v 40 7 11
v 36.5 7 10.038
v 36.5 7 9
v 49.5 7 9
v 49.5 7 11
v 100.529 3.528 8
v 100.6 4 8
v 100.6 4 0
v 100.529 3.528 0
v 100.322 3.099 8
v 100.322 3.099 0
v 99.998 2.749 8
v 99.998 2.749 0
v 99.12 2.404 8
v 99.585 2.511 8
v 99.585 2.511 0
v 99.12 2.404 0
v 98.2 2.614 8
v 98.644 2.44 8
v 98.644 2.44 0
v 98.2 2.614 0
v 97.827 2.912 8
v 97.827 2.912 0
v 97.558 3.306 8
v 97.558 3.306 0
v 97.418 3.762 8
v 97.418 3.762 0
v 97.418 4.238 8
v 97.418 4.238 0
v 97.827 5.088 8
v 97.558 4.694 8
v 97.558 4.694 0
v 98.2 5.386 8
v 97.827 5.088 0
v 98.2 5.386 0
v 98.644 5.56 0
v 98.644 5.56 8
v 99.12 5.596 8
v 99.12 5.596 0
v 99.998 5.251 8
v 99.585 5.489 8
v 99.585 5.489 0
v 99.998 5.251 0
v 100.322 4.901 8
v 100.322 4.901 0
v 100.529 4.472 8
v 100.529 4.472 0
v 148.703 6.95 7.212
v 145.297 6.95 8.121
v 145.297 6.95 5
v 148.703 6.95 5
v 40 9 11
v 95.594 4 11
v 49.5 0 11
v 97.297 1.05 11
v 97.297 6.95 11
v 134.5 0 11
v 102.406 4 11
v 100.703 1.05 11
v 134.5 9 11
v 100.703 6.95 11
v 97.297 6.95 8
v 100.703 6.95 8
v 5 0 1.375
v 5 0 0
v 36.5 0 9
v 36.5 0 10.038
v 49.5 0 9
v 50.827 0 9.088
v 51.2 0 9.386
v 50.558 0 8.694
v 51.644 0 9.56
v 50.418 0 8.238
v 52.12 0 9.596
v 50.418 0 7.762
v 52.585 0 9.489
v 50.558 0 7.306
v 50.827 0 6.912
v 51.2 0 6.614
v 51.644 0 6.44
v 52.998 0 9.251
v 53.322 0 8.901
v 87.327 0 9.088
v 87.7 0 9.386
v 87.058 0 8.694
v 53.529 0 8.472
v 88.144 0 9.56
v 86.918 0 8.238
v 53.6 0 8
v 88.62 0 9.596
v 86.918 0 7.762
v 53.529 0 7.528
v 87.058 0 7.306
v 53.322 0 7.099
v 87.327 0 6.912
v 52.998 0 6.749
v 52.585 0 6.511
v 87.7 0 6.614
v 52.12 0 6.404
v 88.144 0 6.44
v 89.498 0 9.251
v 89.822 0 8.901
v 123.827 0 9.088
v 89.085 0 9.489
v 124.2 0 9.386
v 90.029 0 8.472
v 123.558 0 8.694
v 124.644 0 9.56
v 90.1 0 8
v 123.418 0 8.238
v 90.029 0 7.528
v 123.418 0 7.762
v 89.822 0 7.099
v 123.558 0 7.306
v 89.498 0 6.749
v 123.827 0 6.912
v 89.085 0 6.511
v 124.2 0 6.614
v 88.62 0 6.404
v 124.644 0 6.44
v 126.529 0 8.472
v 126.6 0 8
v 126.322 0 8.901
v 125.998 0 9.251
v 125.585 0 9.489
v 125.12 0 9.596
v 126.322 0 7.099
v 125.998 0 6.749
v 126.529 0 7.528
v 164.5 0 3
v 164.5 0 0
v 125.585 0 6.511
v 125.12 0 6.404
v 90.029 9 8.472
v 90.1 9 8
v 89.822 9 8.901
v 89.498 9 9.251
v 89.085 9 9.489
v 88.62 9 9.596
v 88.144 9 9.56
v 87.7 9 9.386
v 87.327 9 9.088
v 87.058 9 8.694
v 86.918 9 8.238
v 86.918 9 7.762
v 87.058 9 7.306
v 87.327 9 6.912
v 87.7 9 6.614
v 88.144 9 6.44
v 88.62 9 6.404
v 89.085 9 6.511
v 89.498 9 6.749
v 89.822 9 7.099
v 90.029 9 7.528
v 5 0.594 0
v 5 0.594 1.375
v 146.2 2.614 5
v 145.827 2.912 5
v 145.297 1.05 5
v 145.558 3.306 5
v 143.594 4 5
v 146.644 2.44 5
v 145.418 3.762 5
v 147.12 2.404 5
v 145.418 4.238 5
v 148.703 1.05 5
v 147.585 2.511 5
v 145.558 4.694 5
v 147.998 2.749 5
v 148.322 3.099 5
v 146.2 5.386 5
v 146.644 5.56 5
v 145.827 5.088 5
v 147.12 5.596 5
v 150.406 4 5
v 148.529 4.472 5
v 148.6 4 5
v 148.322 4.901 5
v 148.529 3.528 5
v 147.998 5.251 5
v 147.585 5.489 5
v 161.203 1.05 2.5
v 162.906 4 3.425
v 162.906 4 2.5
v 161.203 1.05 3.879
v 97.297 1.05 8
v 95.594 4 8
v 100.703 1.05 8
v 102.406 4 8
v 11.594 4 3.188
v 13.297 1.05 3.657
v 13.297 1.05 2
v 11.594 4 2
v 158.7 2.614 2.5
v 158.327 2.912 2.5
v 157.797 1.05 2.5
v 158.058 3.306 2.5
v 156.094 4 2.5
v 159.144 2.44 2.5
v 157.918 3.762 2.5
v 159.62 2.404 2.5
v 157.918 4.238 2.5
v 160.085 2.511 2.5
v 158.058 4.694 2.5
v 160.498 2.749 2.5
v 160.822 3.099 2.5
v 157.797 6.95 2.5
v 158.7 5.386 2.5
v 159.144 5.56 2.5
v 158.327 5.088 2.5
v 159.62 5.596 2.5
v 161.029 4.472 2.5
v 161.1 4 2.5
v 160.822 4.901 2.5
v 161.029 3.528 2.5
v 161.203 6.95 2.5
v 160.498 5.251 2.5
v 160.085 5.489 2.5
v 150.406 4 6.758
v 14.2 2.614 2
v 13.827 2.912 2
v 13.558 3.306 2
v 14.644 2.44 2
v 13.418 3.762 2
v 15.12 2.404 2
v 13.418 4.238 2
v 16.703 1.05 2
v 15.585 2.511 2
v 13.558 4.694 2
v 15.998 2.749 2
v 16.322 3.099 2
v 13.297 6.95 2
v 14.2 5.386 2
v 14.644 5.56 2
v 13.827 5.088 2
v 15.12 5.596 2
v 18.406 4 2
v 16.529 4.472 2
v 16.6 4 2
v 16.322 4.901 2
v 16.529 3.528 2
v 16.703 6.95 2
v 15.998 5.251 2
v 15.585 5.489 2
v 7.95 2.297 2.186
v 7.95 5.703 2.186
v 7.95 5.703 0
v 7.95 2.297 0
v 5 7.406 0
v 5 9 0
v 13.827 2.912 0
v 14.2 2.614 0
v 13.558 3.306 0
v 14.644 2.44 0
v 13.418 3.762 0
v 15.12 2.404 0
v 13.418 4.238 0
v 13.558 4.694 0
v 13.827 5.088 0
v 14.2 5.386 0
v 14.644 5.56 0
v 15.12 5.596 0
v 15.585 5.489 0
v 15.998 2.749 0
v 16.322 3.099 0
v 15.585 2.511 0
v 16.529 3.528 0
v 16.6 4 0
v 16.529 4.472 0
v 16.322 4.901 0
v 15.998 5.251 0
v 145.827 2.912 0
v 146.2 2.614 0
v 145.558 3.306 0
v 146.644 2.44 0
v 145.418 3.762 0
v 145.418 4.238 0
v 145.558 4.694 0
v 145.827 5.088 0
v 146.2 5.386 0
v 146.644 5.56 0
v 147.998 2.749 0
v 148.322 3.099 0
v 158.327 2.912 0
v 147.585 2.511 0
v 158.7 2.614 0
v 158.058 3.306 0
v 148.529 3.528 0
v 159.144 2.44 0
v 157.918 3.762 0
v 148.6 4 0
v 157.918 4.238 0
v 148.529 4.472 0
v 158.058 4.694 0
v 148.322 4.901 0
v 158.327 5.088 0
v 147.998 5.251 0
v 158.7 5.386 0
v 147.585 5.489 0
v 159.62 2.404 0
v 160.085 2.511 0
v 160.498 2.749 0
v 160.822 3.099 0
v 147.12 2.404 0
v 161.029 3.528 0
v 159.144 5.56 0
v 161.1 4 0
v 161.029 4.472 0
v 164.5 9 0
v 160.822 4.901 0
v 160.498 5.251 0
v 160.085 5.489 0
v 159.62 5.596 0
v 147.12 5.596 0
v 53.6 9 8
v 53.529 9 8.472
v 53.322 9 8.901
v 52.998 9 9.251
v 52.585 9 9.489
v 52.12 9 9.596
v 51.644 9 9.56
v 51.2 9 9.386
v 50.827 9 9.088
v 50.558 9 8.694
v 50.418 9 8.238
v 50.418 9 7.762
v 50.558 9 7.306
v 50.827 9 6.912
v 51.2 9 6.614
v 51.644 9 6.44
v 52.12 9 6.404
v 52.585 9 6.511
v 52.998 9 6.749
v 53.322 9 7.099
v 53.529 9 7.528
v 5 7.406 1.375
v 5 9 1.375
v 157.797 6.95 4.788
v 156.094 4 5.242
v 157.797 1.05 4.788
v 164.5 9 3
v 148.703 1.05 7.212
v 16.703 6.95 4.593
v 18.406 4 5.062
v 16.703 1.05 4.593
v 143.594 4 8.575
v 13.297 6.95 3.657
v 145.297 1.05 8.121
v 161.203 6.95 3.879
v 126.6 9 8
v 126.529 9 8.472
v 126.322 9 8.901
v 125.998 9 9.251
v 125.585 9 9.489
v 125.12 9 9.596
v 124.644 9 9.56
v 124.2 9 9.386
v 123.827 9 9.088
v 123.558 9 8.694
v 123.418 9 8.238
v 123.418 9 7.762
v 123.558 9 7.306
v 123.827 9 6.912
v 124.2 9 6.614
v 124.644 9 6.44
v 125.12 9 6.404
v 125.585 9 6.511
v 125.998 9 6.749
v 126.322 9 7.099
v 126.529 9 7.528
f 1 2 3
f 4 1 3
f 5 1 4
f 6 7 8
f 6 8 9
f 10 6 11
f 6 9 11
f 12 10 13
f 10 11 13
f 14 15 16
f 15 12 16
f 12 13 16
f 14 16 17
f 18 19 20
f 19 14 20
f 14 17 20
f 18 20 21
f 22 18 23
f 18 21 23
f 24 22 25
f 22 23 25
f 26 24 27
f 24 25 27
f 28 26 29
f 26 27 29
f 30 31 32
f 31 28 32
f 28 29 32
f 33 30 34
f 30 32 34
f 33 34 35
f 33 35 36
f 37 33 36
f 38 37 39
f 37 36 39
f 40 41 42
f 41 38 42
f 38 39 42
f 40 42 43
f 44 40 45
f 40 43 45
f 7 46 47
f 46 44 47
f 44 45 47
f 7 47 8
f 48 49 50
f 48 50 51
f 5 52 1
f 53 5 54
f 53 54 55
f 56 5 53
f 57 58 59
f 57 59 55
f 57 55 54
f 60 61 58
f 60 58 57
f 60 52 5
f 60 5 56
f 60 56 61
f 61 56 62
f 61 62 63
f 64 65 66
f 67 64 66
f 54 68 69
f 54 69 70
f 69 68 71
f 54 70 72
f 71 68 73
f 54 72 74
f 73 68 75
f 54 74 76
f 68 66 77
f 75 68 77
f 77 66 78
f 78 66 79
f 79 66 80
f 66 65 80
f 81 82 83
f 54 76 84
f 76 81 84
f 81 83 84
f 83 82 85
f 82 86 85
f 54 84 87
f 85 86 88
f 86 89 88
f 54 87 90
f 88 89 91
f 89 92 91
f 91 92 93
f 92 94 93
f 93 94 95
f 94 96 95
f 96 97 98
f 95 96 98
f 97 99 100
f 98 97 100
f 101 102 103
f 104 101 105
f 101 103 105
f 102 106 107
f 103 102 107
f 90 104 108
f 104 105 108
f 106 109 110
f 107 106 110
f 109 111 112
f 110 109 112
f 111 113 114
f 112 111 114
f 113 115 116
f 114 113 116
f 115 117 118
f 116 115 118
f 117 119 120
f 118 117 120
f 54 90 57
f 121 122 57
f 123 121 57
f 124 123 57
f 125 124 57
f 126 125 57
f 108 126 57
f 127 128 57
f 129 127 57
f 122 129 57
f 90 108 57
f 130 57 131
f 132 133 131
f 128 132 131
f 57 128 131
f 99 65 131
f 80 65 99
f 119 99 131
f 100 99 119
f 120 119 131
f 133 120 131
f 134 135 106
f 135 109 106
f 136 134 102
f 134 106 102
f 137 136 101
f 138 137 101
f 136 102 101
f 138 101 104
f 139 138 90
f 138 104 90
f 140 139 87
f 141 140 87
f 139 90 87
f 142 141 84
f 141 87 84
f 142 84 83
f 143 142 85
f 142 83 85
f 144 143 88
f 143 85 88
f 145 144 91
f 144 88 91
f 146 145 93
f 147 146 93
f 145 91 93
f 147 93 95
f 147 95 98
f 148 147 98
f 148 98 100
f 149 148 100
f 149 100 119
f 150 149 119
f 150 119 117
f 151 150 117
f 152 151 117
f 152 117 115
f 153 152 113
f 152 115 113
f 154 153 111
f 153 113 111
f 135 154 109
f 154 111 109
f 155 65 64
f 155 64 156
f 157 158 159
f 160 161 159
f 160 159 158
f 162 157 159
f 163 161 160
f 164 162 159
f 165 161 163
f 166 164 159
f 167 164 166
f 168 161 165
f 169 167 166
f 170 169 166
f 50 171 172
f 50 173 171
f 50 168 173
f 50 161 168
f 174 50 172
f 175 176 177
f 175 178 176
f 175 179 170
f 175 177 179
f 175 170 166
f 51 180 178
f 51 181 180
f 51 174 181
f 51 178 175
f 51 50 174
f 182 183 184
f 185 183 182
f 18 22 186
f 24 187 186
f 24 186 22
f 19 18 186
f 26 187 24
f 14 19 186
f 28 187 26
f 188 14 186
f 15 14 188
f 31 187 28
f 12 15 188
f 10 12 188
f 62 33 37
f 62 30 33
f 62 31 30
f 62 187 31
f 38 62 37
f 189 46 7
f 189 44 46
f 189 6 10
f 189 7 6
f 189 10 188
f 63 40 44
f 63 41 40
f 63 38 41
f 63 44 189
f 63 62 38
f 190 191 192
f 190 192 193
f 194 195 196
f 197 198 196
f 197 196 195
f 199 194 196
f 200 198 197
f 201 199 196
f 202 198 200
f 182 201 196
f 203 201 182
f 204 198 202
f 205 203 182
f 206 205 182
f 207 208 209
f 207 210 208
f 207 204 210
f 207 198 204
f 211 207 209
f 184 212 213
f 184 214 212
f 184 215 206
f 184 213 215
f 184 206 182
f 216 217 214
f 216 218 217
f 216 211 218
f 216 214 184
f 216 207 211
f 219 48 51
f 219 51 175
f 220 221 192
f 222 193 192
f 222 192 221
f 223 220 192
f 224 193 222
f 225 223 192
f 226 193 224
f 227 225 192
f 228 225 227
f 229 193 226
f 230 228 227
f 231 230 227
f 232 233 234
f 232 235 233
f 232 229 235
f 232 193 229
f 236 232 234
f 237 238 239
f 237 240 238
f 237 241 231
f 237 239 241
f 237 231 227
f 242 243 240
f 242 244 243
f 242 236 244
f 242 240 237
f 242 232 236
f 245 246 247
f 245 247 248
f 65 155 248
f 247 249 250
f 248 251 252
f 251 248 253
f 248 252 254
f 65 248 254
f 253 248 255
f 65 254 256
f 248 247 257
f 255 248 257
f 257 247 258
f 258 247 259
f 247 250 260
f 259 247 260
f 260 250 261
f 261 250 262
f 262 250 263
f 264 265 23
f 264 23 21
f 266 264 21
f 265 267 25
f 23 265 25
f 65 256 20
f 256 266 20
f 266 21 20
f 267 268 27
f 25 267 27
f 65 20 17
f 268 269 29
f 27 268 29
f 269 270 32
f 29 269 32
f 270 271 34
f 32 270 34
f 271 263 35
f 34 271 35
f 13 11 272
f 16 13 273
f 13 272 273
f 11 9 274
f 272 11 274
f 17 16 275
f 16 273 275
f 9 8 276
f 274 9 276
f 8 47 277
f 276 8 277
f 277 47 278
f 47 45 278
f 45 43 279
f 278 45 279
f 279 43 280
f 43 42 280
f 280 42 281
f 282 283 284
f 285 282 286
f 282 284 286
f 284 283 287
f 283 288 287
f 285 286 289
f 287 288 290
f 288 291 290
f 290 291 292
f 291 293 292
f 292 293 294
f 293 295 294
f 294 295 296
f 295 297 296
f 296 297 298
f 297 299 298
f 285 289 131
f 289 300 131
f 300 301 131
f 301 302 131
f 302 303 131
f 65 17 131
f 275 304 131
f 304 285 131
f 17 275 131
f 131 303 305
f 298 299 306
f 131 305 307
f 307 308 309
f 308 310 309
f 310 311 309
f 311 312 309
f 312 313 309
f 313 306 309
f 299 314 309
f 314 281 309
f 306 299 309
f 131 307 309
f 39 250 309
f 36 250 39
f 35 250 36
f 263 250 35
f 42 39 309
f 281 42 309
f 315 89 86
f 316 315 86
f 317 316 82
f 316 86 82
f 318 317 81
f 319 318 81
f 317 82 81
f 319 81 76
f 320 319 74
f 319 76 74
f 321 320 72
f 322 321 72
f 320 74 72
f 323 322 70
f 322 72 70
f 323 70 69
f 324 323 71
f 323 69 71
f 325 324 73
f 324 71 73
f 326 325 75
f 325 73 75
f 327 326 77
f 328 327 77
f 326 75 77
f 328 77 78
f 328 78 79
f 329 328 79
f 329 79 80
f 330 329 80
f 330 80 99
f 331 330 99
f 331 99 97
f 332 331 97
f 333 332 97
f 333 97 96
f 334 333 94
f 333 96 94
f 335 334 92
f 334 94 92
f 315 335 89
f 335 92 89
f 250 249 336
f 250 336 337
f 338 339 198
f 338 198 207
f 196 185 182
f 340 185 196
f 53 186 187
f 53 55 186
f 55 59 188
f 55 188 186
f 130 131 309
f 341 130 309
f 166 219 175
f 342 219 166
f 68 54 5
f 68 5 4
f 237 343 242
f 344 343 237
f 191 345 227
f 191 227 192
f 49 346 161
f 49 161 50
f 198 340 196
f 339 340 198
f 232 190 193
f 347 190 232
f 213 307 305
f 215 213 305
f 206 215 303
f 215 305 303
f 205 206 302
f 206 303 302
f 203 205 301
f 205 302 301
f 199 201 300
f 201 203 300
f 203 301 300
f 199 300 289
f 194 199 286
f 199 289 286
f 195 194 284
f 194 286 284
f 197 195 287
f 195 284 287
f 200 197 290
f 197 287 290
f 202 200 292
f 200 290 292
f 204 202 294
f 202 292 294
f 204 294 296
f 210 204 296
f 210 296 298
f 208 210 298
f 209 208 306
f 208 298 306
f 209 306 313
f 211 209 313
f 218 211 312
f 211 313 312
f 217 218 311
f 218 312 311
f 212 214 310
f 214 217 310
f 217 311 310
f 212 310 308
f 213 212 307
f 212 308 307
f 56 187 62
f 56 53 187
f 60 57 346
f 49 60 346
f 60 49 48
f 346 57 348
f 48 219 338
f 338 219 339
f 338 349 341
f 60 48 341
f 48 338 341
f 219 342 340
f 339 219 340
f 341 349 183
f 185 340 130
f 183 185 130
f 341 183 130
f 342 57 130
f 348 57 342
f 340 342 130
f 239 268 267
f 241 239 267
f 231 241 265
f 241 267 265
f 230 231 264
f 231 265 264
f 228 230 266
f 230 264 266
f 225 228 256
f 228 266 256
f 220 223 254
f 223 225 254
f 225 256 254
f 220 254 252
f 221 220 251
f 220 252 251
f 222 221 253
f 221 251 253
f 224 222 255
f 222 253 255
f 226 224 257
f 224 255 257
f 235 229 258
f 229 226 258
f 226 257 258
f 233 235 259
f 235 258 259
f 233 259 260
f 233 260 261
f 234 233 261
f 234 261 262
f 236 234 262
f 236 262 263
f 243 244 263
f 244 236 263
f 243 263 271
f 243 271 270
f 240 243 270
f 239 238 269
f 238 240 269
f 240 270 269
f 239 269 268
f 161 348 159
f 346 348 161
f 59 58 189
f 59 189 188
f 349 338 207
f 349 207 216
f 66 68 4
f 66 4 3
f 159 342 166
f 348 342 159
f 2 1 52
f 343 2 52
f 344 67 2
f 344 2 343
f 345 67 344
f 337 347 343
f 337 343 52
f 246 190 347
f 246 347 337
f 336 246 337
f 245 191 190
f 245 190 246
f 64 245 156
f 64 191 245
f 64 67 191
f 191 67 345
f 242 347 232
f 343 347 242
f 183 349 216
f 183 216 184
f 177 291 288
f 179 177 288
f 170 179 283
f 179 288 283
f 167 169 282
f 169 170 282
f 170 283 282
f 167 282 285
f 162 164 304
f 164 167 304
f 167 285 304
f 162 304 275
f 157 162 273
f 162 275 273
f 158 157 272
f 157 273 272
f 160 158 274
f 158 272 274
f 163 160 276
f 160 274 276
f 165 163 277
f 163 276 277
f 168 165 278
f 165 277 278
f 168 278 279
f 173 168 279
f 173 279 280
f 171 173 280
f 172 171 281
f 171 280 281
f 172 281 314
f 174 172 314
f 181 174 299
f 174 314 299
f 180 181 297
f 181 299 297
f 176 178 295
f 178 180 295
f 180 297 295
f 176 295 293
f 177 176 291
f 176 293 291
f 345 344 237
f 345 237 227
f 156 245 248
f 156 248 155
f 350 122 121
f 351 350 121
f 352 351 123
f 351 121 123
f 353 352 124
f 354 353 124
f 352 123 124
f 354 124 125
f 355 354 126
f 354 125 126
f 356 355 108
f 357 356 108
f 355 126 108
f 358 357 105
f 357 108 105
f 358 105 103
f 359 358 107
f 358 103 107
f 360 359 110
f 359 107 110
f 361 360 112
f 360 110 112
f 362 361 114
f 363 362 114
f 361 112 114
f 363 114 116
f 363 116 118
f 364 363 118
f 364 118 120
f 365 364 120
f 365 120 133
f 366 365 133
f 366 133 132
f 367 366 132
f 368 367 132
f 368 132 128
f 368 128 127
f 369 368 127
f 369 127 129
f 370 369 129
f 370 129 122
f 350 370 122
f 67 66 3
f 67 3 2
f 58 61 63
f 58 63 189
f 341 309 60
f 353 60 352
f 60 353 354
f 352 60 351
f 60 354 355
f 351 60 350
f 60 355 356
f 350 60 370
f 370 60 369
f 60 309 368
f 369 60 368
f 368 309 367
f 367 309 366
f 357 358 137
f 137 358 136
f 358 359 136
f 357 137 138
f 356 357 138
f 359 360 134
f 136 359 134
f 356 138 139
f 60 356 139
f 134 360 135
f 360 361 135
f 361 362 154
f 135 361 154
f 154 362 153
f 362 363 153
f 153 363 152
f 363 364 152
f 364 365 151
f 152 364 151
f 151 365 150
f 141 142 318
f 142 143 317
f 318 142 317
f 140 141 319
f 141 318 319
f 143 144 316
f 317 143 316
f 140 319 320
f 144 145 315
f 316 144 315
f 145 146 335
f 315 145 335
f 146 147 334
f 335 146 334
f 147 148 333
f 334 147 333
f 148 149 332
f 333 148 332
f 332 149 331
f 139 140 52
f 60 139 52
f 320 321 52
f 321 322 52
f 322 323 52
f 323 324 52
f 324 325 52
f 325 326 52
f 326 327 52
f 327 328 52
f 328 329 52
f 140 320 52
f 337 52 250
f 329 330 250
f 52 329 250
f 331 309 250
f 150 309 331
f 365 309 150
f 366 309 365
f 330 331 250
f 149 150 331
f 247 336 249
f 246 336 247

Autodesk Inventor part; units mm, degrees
ref_plane "YZ Plane" through (0, 0, 0) normal (1, 0, 0) x (0, 1, 0)
ref_plane "XZ Plane" through (0, 0, 0) normal (0, 1, 0) x (-1, 0, 0)
ref_plane "XY Plane" through (0, 0, 0) normal (0, 0, 1) x (1, 0, 0)
sketch "Sketch1" plane through (0, 0, 0) normal (0, 0, 1) x (1, 0, 0)
  line L0 (0, 0) -> (164.5, 0)
  line L1 (164.5, 0) -> (164.5, 9)
  line L2 (164.5, 9) -> (0, 9)
  line L3 (0, 9) -> (0, 0)
  circle A0 centre (99, 4) radius 1.6
  circle A1 centre (159.5, 4) radius 1.6
  circle A2 centre (147, 4) radius 1.6
  circle A3 centre (15, 4) radius 1.6
  circle A4 centre (5, 4) radius 1.6
  dimension "d1" = 9
  dimension "d2" = 90
  dimension "d6" = 3.2
  dimension "d7" = 3.2
  dimension "d9" = 60.5
  dimension "d26" = 3.2
  dimension "d27" = 48
  dimension "d28" = 3.2
  dimension "d32" = 15
  dimension "d33" = 5
  dimension "d61" = 3.2
  dimension "d62" = 10
  dimension "d63" = 12.5
  dimension "d108" = 4
  dimension "d109" = 4
  dimension "d111" = 4
  dimension "d112" = 4
  dimension "d113" = 4
ref_plane "Work Plane2" through (0, 0, 0) normal (0, -1, 0) x (1, 0, 0)
sketch "Sketch2" plane through (0, 0, 0) normal (0, -1, 0) x (1, 0, 0)
  circle A0 centre (52, 8) radius 1.6
  circle A1 centre (125, 8) radius 1.6
  circle A2 centre (88.5, 8) radius 1.6
  point P0 (0, 0)
  point P1 (52, 0)
  dimension "d13" = 3.2
  dimension "d15" = 3.2
  dimension "d17" = 3.2
  dimension "d18" = 36.5
  dimension "d64" = 52
  dimension "d65" = 36.5
  dimension "d114" = 8
  dimension "d115" = 73
ref_plane "Work Plane1" through (0, 0, 11) normal (0, 0, 1) x (1, 0, 0)
extrude "klocek" add sketch "Sketch1" along normal blind 11
ref_plane "Work Plane3" through (0, 0, 0) normal (0, -1, 0) x (1, 0, 0)
extrude "prowadzenie osi" cut sketch "Sketch2" against normal up to next
ref_plane "Work Plane4" through (0, 0, 0) normal (0, -1, 0) x (1, 0, 0)
sketch "Sketch7" plane through (0, 0, 0) normal (0, -1, 0) x (1, 0, 0)
  line L0 (0, 11) -> (0, 0)
  line L1 (0, 11) -> (164.5, 11) projected
  line L2 (0, 11) -> (40, 11)
  line L3 (40, 11) -> (0, 0)
  point P0 (0, -1.8333)
  dimension "d86" = 11
  dimension "d87" = 40
sketch "Sketch8" plane through (0, 0, 0) normal (0, -1, 0) x (1, 0, 0)
  line L0 (164.5, 0) -> (164.5, 11) projected
  line L1 (164.5, 11) -> (164.5, 3)
  line L2 (164.5, 11) -> (0, 11) projected
  line L3 (164.5, 11) -> (134.5, 11)
  line L4 (134.5, 11) -> (164.5, 3)
  point P0 (0, 0)
  point P1 (40.8333, 11)
  dimension "d80" = 8
  dimension "d81" = 30
extrude "przedni skos" cut sketch "Sketch7" against normal up to next
extrude "tylni skos" cut sketch "Sketch8" against normal up to next
ref_plane "Work Plane7" through (0, 0, 11) normal (0, 0, 1) x (1, 0, 0)
sketch "Sketch5" plane through (0, 0, 11) normal (0, 0, 1) x (1, 0, 0)
  circle A0 centre (99, 4) radius 1.6 projected
  line L0 (95.5936, 4) -> (97.2968, 6.95)
  line L1 (97.2968, 6.95) -> (100.7032, 6.95)
  line L2 (100.7032, 6.95) -> (102.4064, 4)
  line L3 (102.4064, 4) -> (100.7032, 1.05)
  line L4 (100.7032, 1.05) -> (97.2968, 1.05)
  line L5 (97.2968, 1.05) -> (95.5936, 4)
  point P0 (119.5, 5)
  dimension "d98" = 5.9
extrude "hex insert middle" cut sketch "Sketch5" against normal blind 3
ref_plane "Work Plane6" through (0, 0, 11) normal (0, 0, 1) x (1, 0, 0)
sketch "Sketch9" plane through (0, 0, 11) normal (0, 0, 1) x (1, 0, 0)
  circle A0 centre (147, 4) radius 1.6 projected
  line L0 (150.4064, 4) -> (148.7032, 1.05)
  line L1 (148.7032, 1.05) -> (145.2968, 1.05)
  line L2 (145.2968, 1.05) -> (143.5936, 4)
  line L3 (143.5936, 4) -> (145.2968, 6.95)
  line L4 (145.2968, 6.95) -> (148.7032, 6.95)
  line L5 (148.7032, 6.95) -> (150.4064, 4)
  point P0 (0, 0)
  point P1 (153, 5)
  dimension "d99" = 5.9
extrude "hex insert rear 1" cut sketch "Sketch9" against normal blind 6
ref_plane "Work Plane5" through (0, 0, 11) normal (0, 0, 1) x (1, 0, 0)
sketch "Sketch10" plane through (0, 0, 11) normal (0, 0, 1) x (1, 0, 0)
  circle A0 centre (159.5, 4) radius 1.6 projected
  line L0 (162.9064, 4) -> (161.2032, 1.05)
  line L1 (161.2032, 1.05) -> (157.7968, 1.05)
  line L2 (157.7968, 1.05) -> (156.0936, 4)
  line L3 (156.0936, 4) -> (157.7968, 6.95)
  line L4 (157.7968, 6.95) -> (161.2032, 6.95)
  line L5 (161.2032, 6.95) -> (162.9064, 4)
  point P0 (0, 0)
  dimension "d101" = 5.9
extrude "hex insert rear 2" cut sketch "Sketch10" against normal blind 8.5
sketch "Sketch13" plane through (0, 0, 11) normal (0, 0, 1) x (1, 0, 0)
  line L0 (9.54, 0) -> (-1.59, 0) projected
  line L1 (7.95, 2.2968) -> (5, 0.5936)
  line L2 (5, 0.5936) -> (2.05, 2.2968)
  line L3 (2.05, 2.2968) -> (2.05, 5.7032)
  line L4 (2.05, 5.7032) -> (5, 7.4064)
  line L5 (5, 7.4064) -> (7.95, 5.7032)
  line L6 (7.95, 5.7032) -> (7.95, 2.2968)
  point P0 (0, 0)
  point P1 (5, 4)
  point P2 (5, 4)
  dimension "d117" = 5.9
extrude "hex insert front 1" cut sketch "Sketch13" against normal through all
sketch "Sketch16" plane through (0, 0, 11) normal (0, 0, 1) x (1, 0, 0)
  circle A0 centre (15, 4) radius 1.6 projected
  line L0 (18.4064, 4) -> (16.7032, 1.05)
  line L1 (16.7032, 1.05) -> (13.2968, 1.05)
  line L2 (13.2968, 1.05) -> (11.5936, 4)
  line L3 (11.5936, 4) -> (13.2968, 6.95)
  line L4 (13.2968, 6.95) -> (16.7032, 6.95)
  line L5 (16.7032, 6.95) -> (18.4064, 4)
  point P0 (0, 0)
  dimension "d93" = 5.9
extrude "hex insert front 2" cut sketch "Sketch16" against normal blind 9
sketch "Sketch17" plane through (0, 0, 0) normal (0, 0, -1) x (-1, 0, 0)
  line L0 (0, 9) -> (0, 0) projected
  line L1 (0, 0) -> (-5, 0)
  line L2 (-5, 0) -> (-5, 10.0042)
  line L3 (-5, 10.0042) -> (0, 10.0042)
  line L4 (0, 10.0042) -> (0, 0)
  point P0 (-5, 7.4064)
extrude "Extrusion20" cut sketch "Sketch17" against normal up to next
sketch "Sketch18" plane through (40, 0, 11) normal (0, -1, 0) x (1, 0, 0)
  line L0 (9.5, 0) -> (9.5, -2)
  line L1 (9.5, -2) -> (-3.5, -2)
  line L2 (-3.5, -2) -> (-3.5, 0)
  line L3 (-3.5, 0) -> (9.5, 0)
  line L4 (94.5, 0) -> (0, 0) projected
  circle A0 centre (12, -3) radius 1.6 projected
  line L5 (-35, -11) -> (124.5, -11) projected
  point P0 (-40, -11)
  dimension "d102" = 2
  dimension "d103" = 13
  dimension "d104" = 2.5
extrude "Extrusion21" cut sketch "Sketch18" against normal blind 7 contours L0 L1 L2 L3
properties part number "wheel_support_v3_narrow_with_line_sensor"
